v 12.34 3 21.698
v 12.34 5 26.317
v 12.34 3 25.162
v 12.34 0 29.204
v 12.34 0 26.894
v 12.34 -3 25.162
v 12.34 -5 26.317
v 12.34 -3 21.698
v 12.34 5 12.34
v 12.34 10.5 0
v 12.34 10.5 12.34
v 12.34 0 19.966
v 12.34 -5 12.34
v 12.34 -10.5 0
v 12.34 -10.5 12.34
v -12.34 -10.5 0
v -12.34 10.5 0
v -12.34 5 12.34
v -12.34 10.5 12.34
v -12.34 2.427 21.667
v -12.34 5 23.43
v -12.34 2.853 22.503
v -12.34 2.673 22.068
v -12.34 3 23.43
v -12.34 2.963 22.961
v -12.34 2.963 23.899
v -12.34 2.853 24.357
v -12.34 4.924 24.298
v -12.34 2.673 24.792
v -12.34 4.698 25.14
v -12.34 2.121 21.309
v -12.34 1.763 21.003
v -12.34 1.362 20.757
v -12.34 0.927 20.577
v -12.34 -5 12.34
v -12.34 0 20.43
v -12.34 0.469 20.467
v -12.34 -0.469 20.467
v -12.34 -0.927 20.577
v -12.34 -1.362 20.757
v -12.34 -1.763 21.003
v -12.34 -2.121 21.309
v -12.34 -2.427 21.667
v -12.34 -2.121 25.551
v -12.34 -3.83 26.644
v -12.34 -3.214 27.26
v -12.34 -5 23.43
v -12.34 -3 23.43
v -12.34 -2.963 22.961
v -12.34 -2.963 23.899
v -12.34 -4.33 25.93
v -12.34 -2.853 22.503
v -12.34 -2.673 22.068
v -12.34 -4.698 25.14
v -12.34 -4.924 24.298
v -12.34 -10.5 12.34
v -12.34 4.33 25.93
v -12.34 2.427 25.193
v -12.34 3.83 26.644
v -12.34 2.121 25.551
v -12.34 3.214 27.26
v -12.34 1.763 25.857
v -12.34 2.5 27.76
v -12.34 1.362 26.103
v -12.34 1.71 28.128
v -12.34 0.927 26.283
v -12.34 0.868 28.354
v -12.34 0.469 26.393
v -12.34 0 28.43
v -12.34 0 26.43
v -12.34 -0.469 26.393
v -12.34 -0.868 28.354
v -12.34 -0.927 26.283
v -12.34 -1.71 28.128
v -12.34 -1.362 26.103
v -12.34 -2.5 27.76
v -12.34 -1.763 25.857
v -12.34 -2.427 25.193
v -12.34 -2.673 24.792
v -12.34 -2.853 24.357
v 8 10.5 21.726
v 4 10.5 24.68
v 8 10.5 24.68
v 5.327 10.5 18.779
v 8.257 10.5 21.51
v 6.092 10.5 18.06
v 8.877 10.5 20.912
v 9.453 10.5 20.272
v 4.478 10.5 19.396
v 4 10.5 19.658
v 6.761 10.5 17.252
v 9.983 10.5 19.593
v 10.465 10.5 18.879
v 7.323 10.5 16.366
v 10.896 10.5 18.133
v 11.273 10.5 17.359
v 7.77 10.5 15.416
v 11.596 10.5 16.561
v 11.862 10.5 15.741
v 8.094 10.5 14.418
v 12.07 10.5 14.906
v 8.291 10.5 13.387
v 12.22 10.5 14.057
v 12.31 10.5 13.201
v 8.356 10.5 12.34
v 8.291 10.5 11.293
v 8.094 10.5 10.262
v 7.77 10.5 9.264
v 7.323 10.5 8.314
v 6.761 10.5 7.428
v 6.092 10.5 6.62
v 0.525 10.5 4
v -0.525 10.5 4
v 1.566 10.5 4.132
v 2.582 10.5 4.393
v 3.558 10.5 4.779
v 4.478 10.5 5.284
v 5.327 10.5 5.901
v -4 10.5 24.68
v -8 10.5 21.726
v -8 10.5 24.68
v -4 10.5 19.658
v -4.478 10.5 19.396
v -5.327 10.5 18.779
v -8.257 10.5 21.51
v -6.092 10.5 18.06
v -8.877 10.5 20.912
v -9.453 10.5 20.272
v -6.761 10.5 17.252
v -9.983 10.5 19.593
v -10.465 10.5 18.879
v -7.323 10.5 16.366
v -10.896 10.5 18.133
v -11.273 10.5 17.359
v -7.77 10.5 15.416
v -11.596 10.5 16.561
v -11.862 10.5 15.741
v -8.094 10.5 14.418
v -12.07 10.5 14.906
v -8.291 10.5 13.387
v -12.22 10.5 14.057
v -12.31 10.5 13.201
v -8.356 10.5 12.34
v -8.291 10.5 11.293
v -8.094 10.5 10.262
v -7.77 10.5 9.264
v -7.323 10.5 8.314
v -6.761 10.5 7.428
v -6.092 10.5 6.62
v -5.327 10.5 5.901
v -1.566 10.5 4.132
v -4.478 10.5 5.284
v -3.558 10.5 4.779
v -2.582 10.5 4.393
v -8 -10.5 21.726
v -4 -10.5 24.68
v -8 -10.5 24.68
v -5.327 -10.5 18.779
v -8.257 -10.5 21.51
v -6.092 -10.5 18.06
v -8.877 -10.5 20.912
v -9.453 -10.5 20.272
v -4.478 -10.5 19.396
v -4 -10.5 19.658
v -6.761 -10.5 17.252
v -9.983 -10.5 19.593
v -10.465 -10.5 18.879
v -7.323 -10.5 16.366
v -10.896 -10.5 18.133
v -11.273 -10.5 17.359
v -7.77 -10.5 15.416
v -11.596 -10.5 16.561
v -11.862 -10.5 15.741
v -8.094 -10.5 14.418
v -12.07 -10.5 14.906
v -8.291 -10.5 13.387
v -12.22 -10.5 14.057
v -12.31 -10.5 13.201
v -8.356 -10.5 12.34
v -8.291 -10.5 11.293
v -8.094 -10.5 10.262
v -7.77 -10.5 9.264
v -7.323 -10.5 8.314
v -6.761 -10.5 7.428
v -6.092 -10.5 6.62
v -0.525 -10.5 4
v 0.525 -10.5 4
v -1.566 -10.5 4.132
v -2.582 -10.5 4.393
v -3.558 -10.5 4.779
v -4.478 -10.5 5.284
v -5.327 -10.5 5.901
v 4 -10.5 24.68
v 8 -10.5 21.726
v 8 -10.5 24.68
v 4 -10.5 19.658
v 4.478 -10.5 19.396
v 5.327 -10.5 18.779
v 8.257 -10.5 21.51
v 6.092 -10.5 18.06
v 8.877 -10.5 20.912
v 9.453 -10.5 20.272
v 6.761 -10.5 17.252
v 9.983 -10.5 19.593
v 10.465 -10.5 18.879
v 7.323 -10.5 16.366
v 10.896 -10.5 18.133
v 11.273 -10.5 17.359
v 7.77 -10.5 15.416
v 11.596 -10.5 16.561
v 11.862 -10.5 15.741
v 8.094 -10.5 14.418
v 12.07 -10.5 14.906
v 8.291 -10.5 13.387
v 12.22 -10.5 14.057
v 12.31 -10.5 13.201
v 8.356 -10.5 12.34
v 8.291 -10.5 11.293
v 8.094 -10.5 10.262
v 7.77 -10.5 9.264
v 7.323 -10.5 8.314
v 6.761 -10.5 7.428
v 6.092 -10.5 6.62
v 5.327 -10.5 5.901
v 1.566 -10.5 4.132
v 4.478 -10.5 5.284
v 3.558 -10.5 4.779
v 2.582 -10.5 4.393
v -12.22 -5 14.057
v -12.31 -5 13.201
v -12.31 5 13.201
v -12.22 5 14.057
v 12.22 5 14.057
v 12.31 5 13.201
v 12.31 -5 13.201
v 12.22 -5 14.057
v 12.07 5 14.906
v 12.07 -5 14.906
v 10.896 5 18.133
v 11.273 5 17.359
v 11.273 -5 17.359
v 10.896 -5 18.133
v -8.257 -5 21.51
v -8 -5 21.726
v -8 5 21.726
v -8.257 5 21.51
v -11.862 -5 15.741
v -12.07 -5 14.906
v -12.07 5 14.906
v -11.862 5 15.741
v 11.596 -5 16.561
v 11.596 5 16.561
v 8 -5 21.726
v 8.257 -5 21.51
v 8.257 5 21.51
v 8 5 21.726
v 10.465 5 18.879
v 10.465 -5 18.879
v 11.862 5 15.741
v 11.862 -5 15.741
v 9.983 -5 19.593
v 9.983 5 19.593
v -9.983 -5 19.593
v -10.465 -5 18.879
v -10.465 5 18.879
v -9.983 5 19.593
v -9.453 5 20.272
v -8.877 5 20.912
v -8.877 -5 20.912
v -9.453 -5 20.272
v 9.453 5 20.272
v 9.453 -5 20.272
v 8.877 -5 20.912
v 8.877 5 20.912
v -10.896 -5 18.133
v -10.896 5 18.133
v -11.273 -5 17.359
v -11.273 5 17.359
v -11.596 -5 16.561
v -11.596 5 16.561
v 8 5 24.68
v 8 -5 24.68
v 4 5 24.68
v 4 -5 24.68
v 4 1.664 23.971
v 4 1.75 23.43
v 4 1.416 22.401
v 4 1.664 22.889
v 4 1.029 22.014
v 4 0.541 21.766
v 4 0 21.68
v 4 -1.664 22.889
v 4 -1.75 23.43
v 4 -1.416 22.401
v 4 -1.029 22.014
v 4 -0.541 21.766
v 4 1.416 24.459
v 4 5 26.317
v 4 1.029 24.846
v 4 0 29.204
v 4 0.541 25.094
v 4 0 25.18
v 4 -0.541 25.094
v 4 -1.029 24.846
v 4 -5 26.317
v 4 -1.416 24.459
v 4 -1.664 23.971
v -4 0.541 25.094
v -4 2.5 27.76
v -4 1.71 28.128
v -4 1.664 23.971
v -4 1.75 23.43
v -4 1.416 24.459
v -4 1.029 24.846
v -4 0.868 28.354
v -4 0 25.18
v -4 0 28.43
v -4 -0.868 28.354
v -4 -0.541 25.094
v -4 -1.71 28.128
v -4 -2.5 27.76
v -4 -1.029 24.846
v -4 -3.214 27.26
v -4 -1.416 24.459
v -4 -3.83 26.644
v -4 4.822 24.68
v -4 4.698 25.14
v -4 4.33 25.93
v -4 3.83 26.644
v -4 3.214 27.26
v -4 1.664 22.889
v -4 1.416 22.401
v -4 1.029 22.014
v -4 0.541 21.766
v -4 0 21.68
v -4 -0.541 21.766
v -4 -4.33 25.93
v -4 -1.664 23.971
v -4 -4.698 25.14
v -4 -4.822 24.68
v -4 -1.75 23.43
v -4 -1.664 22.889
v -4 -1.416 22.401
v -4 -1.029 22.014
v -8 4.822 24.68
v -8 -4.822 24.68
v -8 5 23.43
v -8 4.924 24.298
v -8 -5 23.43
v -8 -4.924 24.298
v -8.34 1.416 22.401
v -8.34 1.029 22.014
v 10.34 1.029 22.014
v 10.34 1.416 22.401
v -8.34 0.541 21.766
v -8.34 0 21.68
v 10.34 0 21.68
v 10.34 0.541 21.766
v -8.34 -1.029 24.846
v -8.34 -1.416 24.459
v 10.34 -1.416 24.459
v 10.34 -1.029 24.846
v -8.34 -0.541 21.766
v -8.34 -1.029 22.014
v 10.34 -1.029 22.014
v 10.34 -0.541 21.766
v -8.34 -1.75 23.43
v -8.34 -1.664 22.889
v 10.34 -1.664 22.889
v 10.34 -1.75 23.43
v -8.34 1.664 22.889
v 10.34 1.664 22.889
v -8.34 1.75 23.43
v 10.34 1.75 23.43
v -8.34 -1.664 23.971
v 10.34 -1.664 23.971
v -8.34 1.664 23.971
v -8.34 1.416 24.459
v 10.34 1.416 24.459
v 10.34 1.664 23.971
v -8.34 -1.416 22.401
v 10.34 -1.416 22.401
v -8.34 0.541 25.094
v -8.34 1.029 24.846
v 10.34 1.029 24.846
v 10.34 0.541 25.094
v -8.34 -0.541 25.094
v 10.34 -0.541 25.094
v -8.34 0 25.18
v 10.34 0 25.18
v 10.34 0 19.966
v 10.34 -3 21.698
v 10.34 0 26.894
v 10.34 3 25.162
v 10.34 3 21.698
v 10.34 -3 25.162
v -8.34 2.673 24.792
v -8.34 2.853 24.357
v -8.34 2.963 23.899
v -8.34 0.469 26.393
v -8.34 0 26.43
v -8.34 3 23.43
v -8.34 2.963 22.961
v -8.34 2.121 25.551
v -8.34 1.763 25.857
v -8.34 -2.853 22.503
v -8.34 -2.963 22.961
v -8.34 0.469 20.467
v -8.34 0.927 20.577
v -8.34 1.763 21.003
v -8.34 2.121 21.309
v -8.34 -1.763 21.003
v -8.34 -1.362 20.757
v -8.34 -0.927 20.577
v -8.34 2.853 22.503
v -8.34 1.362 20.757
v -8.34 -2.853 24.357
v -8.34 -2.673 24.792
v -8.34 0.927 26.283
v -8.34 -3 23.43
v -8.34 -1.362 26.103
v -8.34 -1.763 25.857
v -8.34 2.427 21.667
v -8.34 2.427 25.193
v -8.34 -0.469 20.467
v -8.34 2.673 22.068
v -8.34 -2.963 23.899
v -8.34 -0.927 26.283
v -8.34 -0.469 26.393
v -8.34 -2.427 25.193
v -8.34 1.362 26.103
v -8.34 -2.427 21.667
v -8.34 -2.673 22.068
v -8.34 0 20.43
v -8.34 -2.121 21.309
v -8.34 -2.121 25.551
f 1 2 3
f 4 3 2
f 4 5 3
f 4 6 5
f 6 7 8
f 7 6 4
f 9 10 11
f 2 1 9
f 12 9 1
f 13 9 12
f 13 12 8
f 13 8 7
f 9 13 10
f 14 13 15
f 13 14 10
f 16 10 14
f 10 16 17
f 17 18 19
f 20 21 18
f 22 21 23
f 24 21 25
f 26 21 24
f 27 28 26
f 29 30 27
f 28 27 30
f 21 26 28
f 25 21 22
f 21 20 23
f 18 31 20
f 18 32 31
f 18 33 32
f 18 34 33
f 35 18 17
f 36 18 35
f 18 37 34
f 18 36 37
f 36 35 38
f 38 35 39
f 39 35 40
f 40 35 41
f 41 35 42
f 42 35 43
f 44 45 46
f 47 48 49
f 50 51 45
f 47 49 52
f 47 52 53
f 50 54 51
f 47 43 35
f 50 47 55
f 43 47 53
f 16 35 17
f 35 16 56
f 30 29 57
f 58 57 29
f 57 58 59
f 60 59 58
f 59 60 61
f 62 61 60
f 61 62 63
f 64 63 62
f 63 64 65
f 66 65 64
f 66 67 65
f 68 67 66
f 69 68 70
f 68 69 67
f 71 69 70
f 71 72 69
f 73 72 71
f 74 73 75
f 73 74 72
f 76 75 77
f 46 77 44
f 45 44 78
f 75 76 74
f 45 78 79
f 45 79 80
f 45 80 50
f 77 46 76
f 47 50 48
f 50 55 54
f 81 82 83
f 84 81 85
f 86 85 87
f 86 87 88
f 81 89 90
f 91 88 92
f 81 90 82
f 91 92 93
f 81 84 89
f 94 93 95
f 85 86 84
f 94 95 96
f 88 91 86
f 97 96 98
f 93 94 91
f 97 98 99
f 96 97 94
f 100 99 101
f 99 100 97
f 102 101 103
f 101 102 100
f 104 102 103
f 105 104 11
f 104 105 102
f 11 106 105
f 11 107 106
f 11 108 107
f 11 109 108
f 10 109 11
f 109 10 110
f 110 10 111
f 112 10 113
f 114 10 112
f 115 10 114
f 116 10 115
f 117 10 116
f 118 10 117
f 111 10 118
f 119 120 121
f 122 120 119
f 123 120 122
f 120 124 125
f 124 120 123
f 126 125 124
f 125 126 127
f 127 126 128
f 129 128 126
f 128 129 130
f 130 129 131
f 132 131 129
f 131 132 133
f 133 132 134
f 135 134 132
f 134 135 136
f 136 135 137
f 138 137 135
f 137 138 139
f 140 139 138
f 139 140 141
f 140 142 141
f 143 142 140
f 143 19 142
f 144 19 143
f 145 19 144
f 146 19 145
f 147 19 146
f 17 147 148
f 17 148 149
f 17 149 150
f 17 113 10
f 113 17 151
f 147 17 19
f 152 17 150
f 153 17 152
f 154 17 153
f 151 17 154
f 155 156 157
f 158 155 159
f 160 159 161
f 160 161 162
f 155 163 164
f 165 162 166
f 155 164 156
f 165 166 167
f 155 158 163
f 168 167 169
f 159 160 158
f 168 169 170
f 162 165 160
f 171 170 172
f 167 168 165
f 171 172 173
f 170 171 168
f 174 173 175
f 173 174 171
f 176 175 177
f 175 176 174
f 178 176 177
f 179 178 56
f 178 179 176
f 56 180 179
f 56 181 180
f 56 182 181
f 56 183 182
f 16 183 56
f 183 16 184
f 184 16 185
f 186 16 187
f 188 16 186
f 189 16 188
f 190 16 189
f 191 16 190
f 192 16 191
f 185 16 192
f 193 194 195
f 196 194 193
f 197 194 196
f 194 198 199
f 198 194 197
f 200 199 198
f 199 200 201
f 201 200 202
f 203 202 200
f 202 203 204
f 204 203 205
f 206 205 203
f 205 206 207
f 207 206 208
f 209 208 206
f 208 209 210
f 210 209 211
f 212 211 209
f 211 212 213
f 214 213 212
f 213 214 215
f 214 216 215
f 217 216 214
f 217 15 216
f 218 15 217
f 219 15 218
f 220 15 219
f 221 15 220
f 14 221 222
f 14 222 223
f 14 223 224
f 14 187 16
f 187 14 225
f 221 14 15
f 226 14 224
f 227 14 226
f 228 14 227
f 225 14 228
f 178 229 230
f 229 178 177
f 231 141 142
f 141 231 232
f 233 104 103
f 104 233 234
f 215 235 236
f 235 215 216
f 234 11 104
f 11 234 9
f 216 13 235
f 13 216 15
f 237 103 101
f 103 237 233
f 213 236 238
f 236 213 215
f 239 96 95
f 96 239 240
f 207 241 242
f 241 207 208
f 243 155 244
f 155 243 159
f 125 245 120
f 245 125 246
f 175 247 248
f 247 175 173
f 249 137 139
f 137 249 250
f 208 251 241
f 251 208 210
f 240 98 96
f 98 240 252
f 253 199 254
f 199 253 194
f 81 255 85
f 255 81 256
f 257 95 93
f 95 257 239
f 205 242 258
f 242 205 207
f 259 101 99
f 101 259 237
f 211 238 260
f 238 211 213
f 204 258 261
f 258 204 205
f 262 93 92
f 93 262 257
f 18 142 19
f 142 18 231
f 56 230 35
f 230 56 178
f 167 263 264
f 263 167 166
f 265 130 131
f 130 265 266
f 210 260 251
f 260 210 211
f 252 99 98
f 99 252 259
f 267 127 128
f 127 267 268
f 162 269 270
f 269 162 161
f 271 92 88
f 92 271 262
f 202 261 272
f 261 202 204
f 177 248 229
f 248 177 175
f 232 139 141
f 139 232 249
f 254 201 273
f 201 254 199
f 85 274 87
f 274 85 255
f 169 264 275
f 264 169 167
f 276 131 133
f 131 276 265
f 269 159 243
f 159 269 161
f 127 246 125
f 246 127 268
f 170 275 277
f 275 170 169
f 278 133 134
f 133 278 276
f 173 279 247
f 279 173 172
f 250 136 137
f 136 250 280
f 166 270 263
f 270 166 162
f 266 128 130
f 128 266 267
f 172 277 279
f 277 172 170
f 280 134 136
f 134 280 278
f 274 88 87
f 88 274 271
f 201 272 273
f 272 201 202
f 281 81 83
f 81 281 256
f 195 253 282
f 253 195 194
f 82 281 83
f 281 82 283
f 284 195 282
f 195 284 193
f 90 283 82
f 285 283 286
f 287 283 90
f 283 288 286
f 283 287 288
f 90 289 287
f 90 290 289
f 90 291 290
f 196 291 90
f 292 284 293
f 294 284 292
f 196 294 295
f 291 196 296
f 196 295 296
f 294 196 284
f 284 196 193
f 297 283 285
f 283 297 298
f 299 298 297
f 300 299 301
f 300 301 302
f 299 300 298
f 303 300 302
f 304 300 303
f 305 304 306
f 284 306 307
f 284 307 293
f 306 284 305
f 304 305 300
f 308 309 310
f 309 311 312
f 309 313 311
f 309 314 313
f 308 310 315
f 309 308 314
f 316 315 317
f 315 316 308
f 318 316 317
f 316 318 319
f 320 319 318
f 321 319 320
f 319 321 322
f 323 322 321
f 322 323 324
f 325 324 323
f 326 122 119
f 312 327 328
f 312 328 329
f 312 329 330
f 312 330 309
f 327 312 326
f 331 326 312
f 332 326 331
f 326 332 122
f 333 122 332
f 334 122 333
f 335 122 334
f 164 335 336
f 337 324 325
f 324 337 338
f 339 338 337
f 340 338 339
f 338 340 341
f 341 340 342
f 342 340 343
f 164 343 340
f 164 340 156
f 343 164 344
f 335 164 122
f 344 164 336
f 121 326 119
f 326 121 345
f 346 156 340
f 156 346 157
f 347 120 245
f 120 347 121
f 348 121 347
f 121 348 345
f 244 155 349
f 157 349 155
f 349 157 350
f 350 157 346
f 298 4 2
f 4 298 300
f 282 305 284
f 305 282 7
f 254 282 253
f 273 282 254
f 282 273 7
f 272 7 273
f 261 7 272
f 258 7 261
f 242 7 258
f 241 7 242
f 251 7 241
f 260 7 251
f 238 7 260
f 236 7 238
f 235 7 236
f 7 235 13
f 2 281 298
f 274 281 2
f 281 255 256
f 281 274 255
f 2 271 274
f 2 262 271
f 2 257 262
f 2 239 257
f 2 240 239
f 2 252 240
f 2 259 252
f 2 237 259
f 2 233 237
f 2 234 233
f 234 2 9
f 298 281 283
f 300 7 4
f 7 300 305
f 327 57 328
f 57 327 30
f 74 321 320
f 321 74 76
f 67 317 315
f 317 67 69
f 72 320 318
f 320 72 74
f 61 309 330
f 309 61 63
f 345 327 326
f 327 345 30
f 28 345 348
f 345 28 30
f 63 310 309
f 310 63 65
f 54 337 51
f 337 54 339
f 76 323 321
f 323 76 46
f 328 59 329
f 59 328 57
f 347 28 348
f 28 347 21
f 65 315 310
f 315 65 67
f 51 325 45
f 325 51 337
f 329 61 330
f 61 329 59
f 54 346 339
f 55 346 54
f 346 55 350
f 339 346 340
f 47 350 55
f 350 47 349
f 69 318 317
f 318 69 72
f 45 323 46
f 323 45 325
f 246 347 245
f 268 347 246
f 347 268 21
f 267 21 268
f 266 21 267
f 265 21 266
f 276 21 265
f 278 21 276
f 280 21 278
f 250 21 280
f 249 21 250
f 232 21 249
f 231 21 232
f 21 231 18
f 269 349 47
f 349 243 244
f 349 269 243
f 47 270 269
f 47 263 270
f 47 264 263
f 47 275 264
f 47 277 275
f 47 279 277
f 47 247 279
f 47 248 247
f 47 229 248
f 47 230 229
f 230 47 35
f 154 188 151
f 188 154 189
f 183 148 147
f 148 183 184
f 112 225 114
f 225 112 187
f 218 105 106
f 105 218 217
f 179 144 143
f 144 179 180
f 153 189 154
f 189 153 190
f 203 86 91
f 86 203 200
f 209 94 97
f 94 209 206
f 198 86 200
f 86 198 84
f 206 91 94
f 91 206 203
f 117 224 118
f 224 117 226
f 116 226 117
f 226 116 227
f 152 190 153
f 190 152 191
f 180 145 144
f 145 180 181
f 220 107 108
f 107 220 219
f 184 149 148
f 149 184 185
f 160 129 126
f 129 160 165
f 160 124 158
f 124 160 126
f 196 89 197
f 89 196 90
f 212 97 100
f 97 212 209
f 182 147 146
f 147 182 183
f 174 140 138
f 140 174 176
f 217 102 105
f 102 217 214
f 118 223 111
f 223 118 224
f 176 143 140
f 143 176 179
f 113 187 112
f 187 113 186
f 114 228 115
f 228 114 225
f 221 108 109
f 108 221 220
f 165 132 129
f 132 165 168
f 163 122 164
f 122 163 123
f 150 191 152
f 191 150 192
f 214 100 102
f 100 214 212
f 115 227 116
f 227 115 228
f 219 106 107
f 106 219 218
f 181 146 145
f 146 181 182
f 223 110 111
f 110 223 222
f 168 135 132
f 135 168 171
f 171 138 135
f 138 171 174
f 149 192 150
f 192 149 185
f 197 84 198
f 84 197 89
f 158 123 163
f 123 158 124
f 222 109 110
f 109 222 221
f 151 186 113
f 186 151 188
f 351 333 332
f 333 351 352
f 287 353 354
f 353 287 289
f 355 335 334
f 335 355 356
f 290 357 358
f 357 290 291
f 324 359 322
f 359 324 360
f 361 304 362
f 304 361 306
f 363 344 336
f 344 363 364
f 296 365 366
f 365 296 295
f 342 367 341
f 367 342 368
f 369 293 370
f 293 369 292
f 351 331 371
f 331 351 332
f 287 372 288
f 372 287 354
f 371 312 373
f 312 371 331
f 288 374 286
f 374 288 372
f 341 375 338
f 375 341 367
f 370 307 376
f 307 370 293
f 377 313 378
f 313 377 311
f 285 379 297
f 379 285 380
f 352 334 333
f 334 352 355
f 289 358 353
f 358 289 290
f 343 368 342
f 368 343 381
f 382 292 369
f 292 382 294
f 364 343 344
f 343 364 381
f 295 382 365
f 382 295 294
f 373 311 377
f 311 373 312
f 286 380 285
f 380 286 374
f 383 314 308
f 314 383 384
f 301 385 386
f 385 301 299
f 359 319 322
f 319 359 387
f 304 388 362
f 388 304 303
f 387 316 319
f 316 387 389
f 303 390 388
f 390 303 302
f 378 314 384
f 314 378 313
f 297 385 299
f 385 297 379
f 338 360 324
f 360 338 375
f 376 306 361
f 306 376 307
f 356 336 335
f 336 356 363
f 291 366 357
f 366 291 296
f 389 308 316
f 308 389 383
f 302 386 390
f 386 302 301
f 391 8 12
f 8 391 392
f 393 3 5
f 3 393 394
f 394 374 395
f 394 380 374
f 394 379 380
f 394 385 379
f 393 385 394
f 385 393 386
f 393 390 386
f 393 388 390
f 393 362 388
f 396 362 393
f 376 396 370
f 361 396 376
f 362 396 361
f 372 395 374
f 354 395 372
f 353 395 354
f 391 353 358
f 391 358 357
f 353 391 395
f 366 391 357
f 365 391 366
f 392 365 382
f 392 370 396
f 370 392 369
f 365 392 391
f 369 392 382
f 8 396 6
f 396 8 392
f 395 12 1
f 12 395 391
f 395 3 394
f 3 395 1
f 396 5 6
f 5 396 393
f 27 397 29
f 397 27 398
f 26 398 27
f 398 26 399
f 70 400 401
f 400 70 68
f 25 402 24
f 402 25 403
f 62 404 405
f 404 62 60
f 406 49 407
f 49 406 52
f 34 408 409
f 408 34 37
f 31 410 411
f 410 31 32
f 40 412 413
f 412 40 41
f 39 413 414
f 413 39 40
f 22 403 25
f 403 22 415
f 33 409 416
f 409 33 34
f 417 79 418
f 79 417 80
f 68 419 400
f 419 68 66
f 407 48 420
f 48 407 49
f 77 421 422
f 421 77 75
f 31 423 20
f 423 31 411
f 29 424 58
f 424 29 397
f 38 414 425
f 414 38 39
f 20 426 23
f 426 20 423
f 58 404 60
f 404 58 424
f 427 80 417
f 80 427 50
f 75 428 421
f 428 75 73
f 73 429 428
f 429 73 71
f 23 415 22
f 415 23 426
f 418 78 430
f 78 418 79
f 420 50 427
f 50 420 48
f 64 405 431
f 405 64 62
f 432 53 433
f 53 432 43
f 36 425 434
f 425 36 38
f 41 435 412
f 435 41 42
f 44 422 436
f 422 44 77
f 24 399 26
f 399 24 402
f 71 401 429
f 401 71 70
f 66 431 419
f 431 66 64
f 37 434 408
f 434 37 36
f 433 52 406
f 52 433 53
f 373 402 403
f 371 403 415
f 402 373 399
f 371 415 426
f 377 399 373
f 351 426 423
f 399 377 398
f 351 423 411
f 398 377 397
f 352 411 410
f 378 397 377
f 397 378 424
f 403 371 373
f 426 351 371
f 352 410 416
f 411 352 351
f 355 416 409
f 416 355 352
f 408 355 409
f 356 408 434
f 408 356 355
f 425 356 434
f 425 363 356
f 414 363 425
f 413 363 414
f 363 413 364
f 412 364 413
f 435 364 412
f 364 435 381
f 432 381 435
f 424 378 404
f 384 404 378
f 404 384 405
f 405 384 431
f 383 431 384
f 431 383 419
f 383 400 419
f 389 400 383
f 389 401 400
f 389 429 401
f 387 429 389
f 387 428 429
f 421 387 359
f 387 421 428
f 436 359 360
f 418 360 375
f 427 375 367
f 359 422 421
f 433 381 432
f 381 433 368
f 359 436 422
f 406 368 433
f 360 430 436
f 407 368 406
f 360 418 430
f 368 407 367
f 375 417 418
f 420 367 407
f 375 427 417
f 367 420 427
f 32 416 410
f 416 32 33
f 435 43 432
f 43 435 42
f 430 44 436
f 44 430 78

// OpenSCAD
// TFZB holder
// *********************************************
// Marcin Lukasik <marcin@lukasik.name>
// http://marcin.name
// http://www.thingiverse.com/nothinman
// *********************************************
// derived from:
// http://www.thingiverse.com/thing:14942

// TFZB/rod dimensions
TFZB_dia = 16.08 + 0.6; //adding 0.6 for clearance
TFZB_length = 21;
rod_dia = 12;

//screw/nut dimensions (M3) - hexagon socket head cap screw ISO 4762, hexagon nut ISO 4032
screw_thread_dia_iso = 3;
screw_head_dia_iso = 5.5;
screw_head_height = 4;
nut_wrench_size_iso = 5.5;
nut_height = 2;

// screw/nut dimensions for use (plus clearance for fitting purpose)
clearance_dia = 0.5;
screw_thread_dia = screw_thread_dia_iso + clearance_dia;
screw_head_dia = screw_head_dia_iso + clearance_dia;
nut_wrench_size = nut_wrench_size_iso + clearance_dia;
nut_dia_perimeter = (nut_wrench_size/cos(30));
nut_dia = nut_dia_perimeter;
nut_surround_thickness = 2;

// main body dimensions
body_wall_thickness = 4;
body_width = TFZB_dia + (2*body_wall_thickness);
body_height = body_width;
body_length = TFZB_length;
//gap_width = rod_dia + 2;
gap_width = 8;
screw_bushing_space = 1;
screw_elevation = TFZB_dia + body_wall_thickness + (screw_thread_dia/2) + screw_bushing_space;

// TEST - uncomment to render in openscad:
//tfzb_holder(1);		// WITH mountplate
tfzb_holder();		// WITHOUT mountplate


// nophead's polyhole module for better fit
module polyhole(d,h) {
    n = max(round(3 * d),3);
    rotate([0,0,180])
        cylinder(h = h, r = (d / 2) / cos (180 / n), $fn = n);
}


module mount_plate()
{
	difference()
	{
		translate([0,0,1.5])
		cube([body_width+2*screw_head_dia+4*nut_surround_thickness,screw_head_dia+2*nut_surround_thickness,3], center=true);

		for(i=[-1,1])
			translate([i*(body_width/2+nut_surround_thickness+screw_head_dia/2),0,-0.5])
				cylinder(r=screw_thread_dia/2, h=4, $fn=20);
	}
}

// main body
module tfzb_holder(with_mountplate=false)
{
	difference()
	{
		union()
		{
			if (with_mountplate) 
			mount_plate();
	
			// body
			translate([0,0,body_height/4])
				cube([body_width,body_length,body_height/2], center=true);
			translate([0,0,(TFZB_dia/2)+body_wall_thickness])		
				rotate([90,0,0])
					cylinder(r=(TFZB_dia/2)+body_wall_thickness, h=TFZB_length, center=true, $fn=90);
	
			// gap support
			translate([gap_width/2, -(body_length/2), body_height-((TFZB_dia/2)+screw_bushing_space+(screw_thread_dia/2))])
				cube([body_wall_thickness,TFZB_length,(TFZB_dia/2)+screw_bushing_space+(screw_thread_dia/2)]);
			translate([-(gap_width/2)-body_wall_thickness, -(body_length/2), body_height-((TFZB_dia/2)+screw_bushing_space+(screw_thread_dia/2))])
				cube([body_wall_thickness,TFZB_length,(TFZB_dia/2)+screw_bushing_space+(screw_thread_dia/2)]);
	
			// nut trap surround
			translate([gap_width/2,0,screw_elevation])
				rotate([0,90,0])
					cylinder(r=(((nut_wrench_size+nut_surround_thickness*2)/cos(30))/2), h=(body_width-gap_width)/2, $fn=6);
			translate([gap_width/2+(body_width-gap_width)/4,0,screw_elevation/2])
				cube([(body_width-gap_width)/2,nut_wrench_size+(nut_surround_thickness*2),screw_elevation],center=true);

			// Screw hole surround
			translate([-gap_width/2,0,screw_elevation])
				rotate([0,-90,0])
					cylinder(r=(screw_head_dia/2)+nut_surround_thickness, h=(body_width-gap_width)/2, $fn=36);
			translate([-(gap_width/2+(body_width-gap_width)/4),0,screw_elevation/2])
				cube([(body_width-gap_width)/2,screw_head_dia+(nut_surround_thickness*2),screw_elevation],center=true);
		}
	
		// bushing hole
		translate([0,0,TFZB_dia/2+body_wall_thickness])
			rotate([90,0,0])
//				cylinder(r=TFZB_dia/2, h=TFZB_length+1, center=true);
				translate([0,0,-(TFZB_length+1)/2]) polyhole(TFZB_dia,TFZB_length+1);	// TESTING POLYHOLE MODULE FOR BETTER TFZB FIT
	
		// top gap
		translate([-(gap_width/2),-(body_length/2)-1,body_height/2])
			cube([gap_width,TFZB_length+2,(TFZB_dia/2)+screw_bushing_space+(screw_thread_dia/2)+(nut_dia/2)+nut_surround_thickness+1]);
	
		// screw hole (one all the way through)
		translate([0,0,screw_elevation])
			rotate([0,90,0])
				cylinder(r=screw_thread_dia/2, h=body_width+3, center=true, $fn=20);
	
		// nut trap
		translate([body_width/2-nut_height, 0, screw_elevation])
			rotate([0,90,0])
				cylinder(r=nut_dia/2, h=body_width/2-gap_width/2-body_wall_thickness+1,$fn=6);
	
		// screw head hole
		translate([-(body_width/2-screw_head_height), 0, screw_elevation])
			rotate([0,-90,0])
				cylinder(r=screw_head_dia/2, h=body_width/2-gap_width/2-body_wall_thickness+2,$fn=40);
	
	}
}
